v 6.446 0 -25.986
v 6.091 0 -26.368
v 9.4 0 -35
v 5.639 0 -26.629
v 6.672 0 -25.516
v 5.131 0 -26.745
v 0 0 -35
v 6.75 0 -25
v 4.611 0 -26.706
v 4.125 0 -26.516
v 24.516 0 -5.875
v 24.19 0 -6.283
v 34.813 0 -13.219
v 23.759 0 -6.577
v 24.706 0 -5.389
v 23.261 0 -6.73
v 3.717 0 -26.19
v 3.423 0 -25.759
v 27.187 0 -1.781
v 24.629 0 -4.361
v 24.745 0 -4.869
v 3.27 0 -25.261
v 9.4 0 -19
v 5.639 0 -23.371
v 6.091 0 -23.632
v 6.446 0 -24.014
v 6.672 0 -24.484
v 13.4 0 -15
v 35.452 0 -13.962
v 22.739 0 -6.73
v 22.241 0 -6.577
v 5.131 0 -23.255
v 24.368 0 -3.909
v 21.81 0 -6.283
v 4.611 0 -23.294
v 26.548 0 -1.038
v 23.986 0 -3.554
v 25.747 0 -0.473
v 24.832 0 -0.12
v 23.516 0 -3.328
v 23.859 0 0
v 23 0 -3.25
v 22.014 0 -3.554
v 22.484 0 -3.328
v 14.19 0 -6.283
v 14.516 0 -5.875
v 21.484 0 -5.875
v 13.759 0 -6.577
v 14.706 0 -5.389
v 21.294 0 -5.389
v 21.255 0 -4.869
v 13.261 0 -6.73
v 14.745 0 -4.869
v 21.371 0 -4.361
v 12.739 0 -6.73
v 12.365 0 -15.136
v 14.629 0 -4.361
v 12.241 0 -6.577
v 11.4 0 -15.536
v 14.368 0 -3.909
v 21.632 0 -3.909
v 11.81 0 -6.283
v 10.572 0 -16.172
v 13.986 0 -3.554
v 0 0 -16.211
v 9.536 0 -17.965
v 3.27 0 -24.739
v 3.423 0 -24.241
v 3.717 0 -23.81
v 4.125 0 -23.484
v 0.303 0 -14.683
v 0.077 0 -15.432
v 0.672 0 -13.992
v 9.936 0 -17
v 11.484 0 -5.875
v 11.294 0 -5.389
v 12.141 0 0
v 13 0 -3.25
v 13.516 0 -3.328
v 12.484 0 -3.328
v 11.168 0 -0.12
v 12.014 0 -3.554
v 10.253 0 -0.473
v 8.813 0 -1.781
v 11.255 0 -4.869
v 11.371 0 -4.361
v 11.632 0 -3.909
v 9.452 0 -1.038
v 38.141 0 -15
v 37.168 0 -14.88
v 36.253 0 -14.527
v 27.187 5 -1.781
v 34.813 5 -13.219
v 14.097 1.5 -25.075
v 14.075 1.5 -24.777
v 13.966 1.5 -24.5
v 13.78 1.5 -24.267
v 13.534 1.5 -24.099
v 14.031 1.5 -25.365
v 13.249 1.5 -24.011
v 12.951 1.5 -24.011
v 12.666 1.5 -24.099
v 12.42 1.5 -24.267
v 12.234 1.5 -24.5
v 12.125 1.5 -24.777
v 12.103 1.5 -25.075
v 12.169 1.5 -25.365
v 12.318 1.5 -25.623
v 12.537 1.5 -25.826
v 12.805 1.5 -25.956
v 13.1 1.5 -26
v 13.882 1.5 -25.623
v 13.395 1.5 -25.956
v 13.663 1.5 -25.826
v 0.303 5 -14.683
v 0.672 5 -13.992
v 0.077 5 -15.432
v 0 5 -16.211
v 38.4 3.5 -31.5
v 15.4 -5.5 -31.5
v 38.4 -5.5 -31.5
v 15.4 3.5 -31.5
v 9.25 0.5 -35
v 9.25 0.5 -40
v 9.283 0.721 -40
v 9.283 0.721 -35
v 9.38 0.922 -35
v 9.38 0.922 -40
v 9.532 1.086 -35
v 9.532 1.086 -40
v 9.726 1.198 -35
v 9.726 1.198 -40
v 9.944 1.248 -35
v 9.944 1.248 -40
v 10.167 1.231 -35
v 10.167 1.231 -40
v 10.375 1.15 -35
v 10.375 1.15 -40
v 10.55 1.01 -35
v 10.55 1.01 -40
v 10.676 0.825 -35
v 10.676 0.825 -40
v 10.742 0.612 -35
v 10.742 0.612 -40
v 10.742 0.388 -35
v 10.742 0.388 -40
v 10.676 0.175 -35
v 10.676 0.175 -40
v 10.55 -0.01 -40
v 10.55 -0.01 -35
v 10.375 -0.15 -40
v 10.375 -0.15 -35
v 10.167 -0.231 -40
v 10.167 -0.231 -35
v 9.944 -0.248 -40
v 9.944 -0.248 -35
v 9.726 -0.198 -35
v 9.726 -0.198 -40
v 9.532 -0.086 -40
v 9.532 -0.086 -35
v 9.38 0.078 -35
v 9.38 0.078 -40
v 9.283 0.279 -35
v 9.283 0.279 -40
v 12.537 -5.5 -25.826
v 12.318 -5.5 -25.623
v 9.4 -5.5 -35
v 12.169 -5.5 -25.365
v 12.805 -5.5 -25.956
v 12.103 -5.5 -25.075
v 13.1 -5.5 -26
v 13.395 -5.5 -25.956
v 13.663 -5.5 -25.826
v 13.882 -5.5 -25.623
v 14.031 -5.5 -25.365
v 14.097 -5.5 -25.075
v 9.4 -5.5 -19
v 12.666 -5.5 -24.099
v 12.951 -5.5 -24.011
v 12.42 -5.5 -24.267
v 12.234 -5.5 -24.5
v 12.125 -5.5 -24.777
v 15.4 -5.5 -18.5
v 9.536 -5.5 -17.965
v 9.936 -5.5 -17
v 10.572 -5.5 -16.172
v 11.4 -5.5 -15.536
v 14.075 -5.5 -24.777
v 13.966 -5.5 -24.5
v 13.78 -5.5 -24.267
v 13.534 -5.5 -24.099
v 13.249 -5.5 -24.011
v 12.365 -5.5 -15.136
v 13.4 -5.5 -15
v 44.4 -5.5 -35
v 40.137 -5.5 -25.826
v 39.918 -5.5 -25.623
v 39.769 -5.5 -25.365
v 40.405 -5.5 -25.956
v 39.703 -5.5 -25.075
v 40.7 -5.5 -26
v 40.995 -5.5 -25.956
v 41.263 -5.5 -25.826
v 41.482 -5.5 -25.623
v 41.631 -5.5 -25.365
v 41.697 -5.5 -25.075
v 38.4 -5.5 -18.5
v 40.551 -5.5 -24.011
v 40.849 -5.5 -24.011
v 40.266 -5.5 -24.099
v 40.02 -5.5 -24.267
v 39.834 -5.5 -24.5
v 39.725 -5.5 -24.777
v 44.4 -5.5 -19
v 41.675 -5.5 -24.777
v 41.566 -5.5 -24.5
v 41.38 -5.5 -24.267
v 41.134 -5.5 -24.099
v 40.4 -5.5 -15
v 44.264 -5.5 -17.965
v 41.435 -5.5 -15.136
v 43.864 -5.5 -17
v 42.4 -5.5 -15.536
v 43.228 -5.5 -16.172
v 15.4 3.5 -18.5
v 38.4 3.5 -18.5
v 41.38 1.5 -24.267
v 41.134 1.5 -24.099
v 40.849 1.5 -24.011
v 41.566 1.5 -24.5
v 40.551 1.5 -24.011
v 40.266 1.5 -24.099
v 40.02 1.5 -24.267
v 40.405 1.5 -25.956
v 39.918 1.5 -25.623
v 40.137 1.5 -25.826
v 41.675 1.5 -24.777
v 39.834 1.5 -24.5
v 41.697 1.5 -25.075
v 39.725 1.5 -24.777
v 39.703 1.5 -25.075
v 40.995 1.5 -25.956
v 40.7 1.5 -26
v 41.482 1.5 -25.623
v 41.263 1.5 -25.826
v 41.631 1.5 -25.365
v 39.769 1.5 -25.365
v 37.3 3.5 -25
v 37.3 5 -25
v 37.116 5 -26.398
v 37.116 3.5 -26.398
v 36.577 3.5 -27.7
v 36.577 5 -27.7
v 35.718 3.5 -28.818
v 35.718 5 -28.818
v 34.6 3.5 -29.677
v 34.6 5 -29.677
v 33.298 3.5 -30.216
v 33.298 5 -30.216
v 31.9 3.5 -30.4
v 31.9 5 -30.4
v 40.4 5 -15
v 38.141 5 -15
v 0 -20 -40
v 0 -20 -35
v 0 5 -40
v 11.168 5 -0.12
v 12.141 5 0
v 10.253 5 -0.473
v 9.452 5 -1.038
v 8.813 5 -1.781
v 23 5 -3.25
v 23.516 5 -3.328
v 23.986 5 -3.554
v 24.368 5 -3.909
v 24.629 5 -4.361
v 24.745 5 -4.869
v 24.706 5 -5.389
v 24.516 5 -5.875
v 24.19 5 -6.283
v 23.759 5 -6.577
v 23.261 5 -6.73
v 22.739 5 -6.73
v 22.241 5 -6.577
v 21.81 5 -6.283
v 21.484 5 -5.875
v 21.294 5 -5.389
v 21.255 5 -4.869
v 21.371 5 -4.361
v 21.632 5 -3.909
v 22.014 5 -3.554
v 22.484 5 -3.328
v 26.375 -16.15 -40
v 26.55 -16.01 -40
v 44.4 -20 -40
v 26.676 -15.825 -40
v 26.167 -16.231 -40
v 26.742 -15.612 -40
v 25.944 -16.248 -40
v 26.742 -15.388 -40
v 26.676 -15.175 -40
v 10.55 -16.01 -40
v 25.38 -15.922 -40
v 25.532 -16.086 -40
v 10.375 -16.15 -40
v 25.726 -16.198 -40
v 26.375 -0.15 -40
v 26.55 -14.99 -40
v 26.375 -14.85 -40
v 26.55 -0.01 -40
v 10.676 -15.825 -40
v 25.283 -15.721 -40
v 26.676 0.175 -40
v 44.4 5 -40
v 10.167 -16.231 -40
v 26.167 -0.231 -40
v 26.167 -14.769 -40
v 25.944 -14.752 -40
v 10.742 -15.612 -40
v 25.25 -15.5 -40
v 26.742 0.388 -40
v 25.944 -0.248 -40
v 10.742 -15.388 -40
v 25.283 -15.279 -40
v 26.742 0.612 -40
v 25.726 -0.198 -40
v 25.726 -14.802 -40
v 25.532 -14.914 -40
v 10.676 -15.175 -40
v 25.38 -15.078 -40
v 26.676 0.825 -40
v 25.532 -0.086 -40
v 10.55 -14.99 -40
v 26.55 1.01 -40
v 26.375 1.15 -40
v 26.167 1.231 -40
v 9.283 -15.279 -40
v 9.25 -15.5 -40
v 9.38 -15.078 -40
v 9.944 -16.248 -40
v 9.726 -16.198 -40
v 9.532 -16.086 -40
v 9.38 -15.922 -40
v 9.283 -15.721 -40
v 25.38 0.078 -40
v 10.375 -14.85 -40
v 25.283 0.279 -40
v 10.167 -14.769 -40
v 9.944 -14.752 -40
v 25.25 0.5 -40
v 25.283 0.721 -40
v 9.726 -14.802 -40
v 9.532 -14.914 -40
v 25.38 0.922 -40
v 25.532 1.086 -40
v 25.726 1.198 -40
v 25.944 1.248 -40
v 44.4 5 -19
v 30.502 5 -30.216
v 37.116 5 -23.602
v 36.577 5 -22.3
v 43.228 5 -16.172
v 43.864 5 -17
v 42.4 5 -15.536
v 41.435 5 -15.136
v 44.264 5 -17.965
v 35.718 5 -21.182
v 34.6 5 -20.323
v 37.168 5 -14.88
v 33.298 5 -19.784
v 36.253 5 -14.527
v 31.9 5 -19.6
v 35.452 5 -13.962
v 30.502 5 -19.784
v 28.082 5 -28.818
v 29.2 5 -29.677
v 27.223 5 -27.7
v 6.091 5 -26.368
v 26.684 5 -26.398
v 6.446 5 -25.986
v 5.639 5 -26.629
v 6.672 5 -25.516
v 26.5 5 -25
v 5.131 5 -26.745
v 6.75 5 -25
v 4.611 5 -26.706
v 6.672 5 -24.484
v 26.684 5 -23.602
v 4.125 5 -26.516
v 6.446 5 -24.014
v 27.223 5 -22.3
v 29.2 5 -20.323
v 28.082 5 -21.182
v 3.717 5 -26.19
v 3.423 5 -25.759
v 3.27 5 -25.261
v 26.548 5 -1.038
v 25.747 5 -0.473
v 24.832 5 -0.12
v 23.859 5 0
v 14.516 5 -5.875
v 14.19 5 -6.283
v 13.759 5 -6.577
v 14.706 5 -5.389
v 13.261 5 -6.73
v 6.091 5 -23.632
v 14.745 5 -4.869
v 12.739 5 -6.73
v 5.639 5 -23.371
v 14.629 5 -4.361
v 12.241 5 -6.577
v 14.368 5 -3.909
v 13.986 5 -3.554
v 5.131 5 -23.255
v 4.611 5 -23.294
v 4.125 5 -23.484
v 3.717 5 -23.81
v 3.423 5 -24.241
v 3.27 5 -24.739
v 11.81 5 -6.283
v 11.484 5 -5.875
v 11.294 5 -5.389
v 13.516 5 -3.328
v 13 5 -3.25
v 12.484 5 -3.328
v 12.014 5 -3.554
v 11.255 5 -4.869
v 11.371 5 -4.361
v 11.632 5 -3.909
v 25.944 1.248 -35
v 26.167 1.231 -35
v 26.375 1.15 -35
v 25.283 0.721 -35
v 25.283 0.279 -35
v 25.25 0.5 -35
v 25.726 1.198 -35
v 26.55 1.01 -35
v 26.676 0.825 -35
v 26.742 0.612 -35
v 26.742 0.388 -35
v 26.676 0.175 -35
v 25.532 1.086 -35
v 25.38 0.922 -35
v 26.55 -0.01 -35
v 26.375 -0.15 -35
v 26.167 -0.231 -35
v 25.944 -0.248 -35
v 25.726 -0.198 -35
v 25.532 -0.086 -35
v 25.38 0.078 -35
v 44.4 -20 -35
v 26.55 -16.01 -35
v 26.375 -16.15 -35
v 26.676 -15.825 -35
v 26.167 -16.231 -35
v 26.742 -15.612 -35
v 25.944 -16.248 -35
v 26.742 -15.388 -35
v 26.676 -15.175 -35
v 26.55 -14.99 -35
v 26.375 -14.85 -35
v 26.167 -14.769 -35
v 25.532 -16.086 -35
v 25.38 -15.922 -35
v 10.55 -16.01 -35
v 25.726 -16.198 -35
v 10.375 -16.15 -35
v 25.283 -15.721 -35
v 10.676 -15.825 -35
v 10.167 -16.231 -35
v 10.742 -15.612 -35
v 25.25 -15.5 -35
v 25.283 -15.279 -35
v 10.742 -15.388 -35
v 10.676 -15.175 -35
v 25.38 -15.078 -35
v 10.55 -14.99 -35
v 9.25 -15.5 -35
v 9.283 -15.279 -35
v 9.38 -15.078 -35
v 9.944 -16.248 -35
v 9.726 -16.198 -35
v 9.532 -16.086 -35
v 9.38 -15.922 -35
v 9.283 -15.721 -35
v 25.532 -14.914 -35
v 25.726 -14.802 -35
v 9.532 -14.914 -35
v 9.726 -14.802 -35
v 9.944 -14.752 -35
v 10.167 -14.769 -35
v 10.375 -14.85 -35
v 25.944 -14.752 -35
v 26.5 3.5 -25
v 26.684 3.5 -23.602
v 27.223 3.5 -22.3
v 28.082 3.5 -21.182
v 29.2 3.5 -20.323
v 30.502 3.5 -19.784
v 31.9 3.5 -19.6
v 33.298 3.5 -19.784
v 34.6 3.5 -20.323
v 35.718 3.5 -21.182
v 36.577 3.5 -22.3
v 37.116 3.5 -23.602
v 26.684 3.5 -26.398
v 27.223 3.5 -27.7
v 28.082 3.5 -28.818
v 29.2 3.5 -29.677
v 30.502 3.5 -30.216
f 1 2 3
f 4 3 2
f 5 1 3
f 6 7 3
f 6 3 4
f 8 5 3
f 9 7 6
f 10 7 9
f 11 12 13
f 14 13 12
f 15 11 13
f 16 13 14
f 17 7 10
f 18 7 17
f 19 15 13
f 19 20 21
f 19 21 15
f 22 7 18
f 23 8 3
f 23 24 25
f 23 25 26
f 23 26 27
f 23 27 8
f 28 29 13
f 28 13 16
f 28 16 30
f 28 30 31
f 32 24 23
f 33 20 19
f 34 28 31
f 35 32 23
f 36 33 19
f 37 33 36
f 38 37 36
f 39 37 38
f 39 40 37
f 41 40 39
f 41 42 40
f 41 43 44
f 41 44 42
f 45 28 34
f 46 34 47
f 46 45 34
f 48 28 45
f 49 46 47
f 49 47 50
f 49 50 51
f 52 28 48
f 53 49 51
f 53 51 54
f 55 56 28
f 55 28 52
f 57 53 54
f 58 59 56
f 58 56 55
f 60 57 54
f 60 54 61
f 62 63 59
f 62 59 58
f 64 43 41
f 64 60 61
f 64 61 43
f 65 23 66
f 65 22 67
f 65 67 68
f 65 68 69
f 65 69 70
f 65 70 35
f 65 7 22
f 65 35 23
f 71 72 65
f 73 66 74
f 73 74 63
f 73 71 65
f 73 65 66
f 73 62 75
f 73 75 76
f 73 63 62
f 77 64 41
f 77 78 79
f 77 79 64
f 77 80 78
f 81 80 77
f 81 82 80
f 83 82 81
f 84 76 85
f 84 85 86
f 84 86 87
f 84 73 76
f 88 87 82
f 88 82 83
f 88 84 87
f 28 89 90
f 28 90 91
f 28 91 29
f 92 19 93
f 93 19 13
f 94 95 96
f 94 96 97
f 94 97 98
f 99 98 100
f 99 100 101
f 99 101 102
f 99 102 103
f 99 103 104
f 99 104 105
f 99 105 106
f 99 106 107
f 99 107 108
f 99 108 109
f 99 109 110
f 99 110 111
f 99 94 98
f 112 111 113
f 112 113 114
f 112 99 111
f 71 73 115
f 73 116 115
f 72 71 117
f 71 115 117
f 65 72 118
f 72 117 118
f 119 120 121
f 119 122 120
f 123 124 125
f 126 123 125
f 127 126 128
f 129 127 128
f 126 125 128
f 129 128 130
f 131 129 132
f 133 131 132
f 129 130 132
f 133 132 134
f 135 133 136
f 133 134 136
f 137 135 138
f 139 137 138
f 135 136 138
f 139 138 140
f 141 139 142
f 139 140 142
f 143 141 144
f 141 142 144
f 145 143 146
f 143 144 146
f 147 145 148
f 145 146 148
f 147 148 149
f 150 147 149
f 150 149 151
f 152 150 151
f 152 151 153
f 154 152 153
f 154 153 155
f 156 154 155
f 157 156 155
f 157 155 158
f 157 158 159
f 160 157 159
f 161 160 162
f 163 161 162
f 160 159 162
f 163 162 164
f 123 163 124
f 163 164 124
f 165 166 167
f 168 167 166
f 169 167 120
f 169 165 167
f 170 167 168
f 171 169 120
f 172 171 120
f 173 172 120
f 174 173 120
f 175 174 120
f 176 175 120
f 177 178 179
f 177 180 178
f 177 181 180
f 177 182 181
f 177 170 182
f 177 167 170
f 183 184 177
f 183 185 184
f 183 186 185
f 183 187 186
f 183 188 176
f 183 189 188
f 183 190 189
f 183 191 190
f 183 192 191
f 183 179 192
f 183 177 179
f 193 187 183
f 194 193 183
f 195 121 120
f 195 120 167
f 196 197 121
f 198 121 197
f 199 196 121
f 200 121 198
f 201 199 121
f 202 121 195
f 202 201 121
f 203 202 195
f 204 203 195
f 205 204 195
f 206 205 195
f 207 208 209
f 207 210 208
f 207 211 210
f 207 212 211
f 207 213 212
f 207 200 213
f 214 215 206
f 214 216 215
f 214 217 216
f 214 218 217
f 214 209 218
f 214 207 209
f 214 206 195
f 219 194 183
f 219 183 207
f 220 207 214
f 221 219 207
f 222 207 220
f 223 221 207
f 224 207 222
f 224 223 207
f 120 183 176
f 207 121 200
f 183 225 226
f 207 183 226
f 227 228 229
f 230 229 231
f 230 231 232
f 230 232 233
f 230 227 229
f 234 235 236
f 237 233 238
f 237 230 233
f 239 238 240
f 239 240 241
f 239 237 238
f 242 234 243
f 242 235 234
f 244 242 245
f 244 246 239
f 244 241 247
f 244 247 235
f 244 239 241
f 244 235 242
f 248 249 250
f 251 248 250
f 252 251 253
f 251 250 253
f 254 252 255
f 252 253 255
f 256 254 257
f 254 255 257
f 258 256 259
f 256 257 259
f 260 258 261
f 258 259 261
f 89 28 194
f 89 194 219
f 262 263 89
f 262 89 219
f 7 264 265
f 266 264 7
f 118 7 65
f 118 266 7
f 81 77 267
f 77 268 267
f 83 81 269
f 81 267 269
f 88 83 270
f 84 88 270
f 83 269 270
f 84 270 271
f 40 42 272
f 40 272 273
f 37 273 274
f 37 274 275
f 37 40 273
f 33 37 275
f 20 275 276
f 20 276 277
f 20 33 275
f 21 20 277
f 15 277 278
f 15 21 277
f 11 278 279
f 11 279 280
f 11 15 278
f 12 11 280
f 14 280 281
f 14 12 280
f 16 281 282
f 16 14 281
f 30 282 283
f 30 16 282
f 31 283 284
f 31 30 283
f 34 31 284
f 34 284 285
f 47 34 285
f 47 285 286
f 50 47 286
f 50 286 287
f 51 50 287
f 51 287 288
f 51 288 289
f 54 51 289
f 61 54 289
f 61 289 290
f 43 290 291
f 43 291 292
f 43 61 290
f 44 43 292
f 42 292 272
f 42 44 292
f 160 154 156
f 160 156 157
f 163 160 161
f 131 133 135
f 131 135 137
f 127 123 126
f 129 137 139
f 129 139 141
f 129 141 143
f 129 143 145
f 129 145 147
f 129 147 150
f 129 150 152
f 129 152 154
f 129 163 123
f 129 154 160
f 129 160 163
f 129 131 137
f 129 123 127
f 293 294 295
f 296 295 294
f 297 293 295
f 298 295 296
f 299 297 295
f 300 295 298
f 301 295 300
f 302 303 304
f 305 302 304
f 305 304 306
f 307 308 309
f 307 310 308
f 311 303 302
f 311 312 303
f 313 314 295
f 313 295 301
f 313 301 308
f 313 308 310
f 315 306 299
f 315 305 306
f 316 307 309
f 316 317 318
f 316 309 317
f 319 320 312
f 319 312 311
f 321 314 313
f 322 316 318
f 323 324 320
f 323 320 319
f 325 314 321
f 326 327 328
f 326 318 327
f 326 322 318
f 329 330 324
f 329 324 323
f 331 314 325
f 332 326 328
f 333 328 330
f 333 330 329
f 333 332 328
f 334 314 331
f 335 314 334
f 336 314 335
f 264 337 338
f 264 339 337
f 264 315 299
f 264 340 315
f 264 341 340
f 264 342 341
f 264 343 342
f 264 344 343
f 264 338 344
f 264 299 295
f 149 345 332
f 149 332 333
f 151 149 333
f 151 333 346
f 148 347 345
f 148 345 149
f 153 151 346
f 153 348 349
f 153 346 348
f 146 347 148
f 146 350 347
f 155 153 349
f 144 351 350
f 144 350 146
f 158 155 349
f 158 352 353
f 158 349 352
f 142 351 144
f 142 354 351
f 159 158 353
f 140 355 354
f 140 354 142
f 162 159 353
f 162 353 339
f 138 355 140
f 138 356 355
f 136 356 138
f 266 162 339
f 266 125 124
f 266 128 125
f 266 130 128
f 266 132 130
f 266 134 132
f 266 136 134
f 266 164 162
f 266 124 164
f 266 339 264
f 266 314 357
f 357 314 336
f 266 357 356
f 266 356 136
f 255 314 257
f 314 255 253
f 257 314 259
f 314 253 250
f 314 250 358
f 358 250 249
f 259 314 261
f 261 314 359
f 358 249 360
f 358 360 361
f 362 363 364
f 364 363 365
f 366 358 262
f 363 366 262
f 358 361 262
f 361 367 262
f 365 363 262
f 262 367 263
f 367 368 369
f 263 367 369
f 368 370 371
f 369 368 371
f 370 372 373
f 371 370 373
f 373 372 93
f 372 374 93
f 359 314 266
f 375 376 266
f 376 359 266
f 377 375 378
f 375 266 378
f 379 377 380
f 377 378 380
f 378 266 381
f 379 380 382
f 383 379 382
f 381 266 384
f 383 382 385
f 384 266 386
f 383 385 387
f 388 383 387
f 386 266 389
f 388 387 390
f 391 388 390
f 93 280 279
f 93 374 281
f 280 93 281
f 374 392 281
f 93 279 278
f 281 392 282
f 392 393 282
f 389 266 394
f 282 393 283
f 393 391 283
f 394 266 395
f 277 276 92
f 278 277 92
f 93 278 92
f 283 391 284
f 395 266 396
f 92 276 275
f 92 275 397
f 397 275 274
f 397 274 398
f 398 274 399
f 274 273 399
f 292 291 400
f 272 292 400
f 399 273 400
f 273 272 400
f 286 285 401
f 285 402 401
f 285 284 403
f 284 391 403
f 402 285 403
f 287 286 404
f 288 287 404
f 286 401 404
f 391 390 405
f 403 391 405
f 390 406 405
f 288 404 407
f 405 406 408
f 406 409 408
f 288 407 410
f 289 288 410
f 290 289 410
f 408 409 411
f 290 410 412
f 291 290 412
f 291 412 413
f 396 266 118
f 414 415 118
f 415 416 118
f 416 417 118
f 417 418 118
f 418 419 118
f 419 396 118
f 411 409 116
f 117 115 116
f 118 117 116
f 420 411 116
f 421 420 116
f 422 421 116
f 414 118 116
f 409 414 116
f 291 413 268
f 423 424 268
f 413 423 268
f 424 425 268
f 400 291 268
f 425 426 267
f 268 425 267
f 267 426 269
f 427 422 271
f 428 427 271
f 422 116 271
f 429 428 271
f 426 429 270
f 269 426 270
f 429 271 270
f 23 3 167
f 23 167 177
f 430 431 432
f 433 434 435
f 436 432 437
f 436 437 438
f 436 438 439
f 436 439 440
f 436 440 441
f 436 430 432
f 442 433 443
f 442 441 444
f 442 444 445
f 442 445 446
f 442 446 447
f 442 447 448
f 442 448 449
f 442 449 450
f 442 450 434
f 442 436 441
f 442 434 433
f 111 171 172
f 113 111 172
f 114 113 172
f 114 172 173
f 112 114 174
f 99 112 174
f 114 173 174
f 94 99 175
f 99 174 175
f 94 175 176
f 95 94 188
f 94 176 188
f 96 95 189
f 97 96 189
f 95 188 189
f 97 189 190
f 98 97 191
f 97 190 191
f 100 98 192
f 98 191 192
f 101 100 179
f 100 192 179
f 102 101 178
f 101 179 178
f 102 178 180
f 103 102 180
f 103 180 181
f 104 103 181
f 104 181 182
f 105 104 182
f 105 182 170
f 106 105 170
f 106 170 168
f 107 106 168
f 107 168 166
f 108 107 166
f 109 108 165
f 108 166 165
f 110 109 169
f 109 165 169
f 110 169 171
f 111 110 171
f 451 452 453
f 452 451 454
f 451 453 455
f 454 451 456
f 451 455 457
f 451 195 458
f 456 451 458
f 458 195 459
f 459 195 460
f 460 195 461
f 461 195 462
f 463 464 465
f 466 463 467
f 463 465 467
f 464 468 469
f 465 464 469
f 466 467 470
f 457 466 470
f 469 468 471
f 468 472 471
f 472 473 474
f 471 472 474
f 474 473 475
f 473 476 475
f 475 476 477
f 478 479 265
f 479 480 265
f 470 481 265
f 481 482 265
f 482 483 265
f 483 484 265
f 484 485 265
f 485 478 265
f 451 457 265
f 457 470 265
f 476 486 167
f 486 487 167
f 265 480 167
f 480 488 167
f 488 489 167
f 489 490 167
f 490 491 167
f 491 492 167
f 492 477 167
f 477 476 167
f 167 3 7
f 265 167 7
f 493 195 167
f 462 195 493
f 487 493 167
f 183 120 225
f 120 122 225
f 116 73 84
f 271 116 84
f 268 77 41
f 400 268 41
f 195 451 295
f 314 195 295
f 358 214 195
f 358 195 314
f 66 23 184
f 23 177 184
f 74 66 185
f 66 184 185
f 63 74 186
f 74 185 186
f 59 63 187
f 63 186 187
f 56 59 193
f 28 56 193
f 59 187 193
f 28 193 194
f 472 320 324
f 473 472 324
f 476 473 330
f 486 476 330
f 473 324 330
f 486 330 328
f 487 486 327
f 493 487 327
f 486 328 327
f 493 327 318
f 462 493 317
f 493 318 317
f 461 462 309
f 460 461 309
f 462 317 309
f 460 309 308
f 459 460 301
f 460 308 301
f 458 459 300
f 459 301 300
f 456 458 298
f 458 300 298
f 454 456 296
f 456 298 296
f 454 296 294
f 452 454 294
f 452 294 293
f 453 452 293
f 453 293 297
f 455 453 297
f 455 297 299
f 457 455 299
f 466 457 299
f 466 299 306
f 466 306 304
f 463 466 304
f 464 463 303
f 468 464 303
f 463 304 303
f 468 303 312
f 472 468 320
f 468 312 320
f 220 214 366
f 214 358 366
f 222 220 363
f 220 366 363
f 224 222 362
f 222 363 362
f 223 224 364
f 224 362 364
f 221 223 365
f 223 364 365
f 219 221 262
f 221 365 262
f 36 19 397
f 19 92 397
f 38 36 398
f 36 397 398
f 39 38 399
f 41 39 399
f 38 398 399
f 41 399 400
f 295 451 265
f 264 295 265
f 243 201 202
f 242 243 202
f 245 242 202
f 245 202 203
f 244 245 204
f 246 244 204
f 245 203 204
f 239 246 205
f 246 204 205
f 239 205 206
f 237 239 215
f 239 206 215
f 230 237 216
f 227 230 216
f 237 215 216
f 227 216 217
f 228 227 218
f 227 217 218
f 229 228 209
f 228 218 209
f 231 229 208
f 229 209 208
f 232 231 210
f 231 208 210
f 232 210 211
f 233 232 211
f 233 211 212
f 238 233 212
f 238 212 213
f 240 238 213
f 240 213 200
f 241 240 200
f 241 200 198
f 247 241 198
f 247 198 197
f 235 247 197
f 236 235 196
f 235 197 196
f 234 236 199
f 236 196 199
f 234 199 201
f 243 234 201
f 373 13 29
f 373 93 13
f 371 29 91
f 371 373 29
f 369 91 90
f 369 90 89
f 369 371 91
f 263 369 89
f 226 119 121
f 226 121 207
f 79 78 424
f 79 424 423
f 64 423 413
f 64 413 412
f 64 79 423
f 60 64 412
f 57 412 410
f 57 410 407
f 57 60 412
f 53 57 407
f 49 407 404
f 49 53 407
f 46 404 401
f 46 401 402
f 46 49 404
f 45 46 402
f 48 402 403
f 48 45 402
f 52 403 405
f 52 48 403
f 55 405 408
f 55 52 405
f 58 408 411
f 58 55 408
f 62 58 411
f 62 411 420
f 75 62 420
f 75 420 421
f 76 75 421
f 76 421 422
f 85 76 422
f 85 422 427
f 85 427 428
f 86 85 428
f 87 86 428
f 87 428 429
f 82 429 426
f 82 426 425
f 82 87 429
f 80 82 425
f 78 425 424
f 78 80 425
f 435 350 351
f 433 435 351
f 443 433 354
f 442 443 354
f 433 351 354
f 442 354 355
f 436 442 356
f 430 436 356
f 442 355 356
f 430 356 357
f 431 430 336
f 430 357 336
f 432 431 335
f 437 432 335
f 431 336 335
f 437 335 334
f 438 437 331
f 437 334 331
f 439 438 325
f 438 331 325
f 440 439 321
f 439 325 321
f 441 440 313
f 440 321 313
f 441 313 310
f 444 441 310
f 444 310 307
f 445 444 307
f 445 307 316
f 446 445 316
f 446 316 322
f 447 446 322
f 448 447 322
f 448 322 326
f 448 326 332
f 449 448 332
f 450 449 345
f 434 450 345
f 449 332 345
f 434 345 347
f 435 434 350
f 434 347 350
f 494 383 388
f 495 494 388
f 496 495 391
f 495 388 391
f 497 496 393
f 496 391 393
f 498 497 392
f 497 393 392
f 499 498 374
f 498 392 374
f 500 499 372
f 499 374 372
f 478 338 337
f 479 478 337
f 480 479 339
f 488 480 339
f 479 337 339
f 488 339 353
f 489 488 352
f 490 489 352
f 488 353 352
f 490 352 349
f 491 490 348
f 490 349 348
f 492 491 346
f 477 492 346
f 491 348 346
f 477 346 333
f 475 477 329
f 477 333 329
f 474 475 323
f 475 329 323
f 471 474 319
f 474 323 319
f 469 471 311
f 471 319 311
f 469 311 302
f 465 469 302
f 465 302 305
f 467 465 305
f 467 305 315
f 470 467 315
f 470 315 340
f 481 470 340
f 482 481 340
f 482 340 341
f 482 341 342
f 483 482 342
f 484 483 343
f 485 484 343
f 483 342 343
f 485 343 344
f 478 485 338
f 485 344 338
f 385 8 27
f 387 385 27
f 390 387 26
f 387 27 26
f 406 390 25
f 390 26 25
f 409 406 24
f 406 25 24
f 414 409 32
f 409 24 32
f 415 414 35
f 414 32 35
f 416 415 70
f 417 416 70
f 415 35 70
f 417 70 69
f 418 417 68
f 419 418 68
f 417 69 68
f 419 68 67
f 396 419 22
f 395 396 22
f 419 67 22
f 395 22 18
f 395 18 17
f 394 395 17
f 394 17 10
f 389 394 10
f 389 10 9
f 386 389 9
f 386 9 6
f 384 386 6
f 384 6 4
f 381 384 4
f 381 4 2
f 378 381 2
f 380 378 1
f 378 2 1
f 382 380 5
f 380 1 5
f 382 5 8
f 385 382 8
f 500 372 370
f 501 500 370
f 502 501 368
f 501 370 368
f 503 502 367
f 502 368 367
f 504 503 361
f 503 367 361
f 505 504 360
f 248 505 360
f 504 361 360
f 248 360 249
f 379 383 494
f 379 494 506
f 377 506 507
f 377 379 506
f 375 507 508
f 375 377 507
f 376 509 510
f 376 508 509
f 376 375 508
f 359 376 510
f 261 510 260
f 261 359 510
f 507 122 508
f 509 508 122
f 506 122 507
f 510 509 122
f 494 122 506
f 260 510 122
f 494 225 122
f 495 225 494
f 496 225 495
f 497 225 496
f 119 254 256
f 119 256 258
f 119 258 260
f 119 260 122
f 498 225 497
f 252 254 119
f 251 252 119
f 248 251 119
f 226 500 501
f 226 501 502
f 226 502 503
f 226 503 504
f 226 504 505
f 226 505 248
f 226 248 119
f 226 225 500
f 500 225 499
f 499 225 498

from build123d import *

# Parameters (mm, degrees)
SKETCH1_R           = 1.75
SKETCH1_W           = 7.2
SKETCH1_H           = 5.4
BOSS_EXTRUDE1_DEPTH = 5
FILLET5_RADIUS      = 10
FILLET5_LENGTH      = 5
FILLET2_R           = 5.4
FILLET6_R           = 5.4
SKETCH3_W           = 35
SKETCH3_H           = 20
SKETCH3_W_2         = 23
SKETCH3_H_2         = 13
BOSS_EXTRUDE4_DEPTH = 5.5
SKETCH5_W           = 23
SKETCH5_H           = 13
CUT_EXTRUDE1_DEPTH  = 3.5
CUT_EXTRUDE2_DEPTH  = 76.201396264
SKETCH9_R           = 1
CUT_EXTRUDE4_DEPTH  = 7
SKETCH10_W          = 36
SKETCH10_H          = 5
CUT_EXTRUDE5_DEPTH  = 10
FILLET10_R          = 4
SKETCH11_W          = 44.4
SKETCH11_H          = 25
BOSS_EXTRUDE5_DEPTH = 5
SKETCH12_W          = 1.180339887
SKETCH12_H          = 5
BOSS_EXTRUDE6_DEPTH = 44.4
SKETCH13_R          = 0.75
CUT_EXTRUDE6_DEPTH  = 5


with BuildPart() as part:
    # Sketch1 → Boss-Extrude1 (new body)
    # profile 1 of 4: a face of its own
    with BuildSketch(Plane(origin=(0, 0, 0), x_dir=(1, 0, 0), z_dir=(0, 1, 0))):
        with BuildLine():
            Line((3.25, 25), (0, 25))
            Line((0, 25), (0, 15))
            Line((0, 15), (10, 0))
            Line((10, 0), (26, 0))
            Line((26, 0), (36, 15))
            Line((36, 15), (60, 15))
            Line((60, 15), (60, 25))
            Line((60, 25), (44.5, 25))
            Line((44.5, 25), (44.5, 19.6))
            Line((44.5, 19.6), (37.3, 19.6))
            Line((37.3, 19.6), (26.5, 19.6))
            Line((26.5, 19.6), (26.5, 25))
            Line((26.5, 25), (6.75, 25))
            ThreePointArc((6.75, 25), (5, 23.25), (3.25, 25))
        make_face()
        with Locations(Location((13, 5, 0), (0, 0, 270))):
            Circle(SKETCH1_R, mode=Mode.SUBTRACT)
        with Locations(Location((23, 5, 0), (0, 0, 270))):
            Circle(SKETCH1_R, mode=Mode.SUBTRACT)
    # profile 2 of 4: a face of its own
    with BuildSketch(Plane(origin=(0, 0, 0), x_dir=(1, 0, 0), z_dir=(0, 1, 0))):
        with BuildLine():
            Line((10, 45), (0, 33.819660113))
            Line((0, 33.819660113), (0, 25))
            Line((0, 25), (3.25, 25))
            ThreePointArc((3.25, 25), (5, 26.75), (6.75, 25))
            Line((6.75, 25), (26.5, 25))
            Line((26.5, 25), (26.5, 30.4))
            Line((26.5, 30.4), (37.3, 30.4))
            Line((37.3, 30.4), (44.5, 30.4))
            Line((44.5, 30.4), (44.5, 25))
            Line((44.5, 25), (60, 25))
            Line((60, 25), (60, 35))
            Line((60, 35), (36, 35))
            Line((36, 35), (26, 45))
            Line((26, 45), (10, 45))
        make_face()
    # profile 3 of 4: a face of its own
    with BuildSketch(Plane(origin=(0, 0, 0), x_dir=(1, 0, 0), z_dir=(0, 1, 0))):
        with Locations((40.9, 27.7)):
            Rectangle(SKETCH1_W, SKETCH1_H)
    # profile 4 of 4: a face of its own
    with BuildSketch(Plane(origin=(0, 0, 0), x_dir=(1, 0, 0), z_dir=(0, 1, 0))):
        with Locations((40.9, 22.3)):
            Rectangle(SKETCH1_W, SKETCH1_H)
    extrude(amount=BOSS_EXTRUDE1_DEPTH)

    # Fillet5: full round fillet: the end face becomes a half cylinder, R = half its width
    fillet5_face = Plane((60, 2.5, -25), x_dir=(0, -1, 0), z_dir=(1, 0, 0))  # on the end face: x along it, z out of the body
    fillet5_slab = fillet5_face.offset(-FILLET5_RADIUS / 2) * Box(FILLET5_LENGTH, 2 * FILLET5_RADIUS, FILLET5_RADIUS, mode=Mode.PRIVATE)  # the body's end, R deep
    fillet5_round = Plane((50, 2.5, -25), x_dir=(1, 0, 0), z_dir=(0, -1, 0)) * Cylinder(FILLET5_RADIUS, FILLET5_LENGTH, mode=Mode.PRIVATE)  # its axis R under the face
    add(fillet5_slab - fillet5_round, mode=Mode.SUBTRACT)

    # Fillet2
    fillet2_edges = [part.edges().sort_by_distance(p)[0] for p in [
        (26.5, 2.5, -30.4),
        (26.5, 2.5, -19.6),
    ]]
    fillet(fillet2_edges, radius=FILLET2_R - 0.0001)  # a hair under: the kernel refuses the full size

    # Fillet6
    fillet6_edges = [part.edges().sort_by_distance(p)[0] for p in [
        (37.3, 2.5, -19.6),
        (37.3, 2.5, -30.4),
    ]]
    fillet(fillet6_edges, radius=FILLET6_R - 0.0001)  # a hair under: the kernel refuses the full size

    # Sketch3 → Boss-Extrude4 (add)
    with BuildSketch(Plane.XZ):
        with Locations((26.9, -25)):
            Rectangle(SKETCH3_W, SKETCH3_H)
        with Locations((26.9, -25)):
            Rectangle(SKETCH3_W_2, SKETCH3_H_2, mode=Mode.SUBTRACT)
    extrude(amount=BOSS_EXTRUDE4_DEPTH)

    # Sketch5 → Cut-Extrude1 (cut)
    with BuildSketch(Plane.XZ):
        with Locations((26.9, -25)):
            Rectangle(SKETCH5_W, SKETCH5_H)
    extrude(amount=-CUT_EXTRUDE1_DEPTH, mode=Mode.SUBTRACT)

    # Sketch6 → Cut-Extrude2 (cut, through all)
    with BuildSketch(Plane.XZ):
        with BuildLine():
            Line((44.4, -15), (44.4, -35))
            Line((44.4, -35), (50, -35))
            ThreePointArc((50, -35), (60, -25), (50, -15))
            Line((50, -15), (44.4, -15))
        make_face()
    extrude(amount=-CUT_EXTRUDE2_DEPTH, mode=Mode.SUBTRACT)

    # Sketch9 → Cut-Extrude4 (cut)
    with BuildSketch(Plane.XZ.offset(5.5)):
        with Locations(Location((13.1, -25, 0), (0, 0, 270))):
            Circle(SKETCH9_R)
        with Locations(Location((40.7, -25, 0), (0, 0, 270))):
            Circle(SKETCH9_R)
    extrude(amount=-CUT_EXTRUDE4_DEPTH, mode=Mode.SUBTRACT)

    # Sketch10 → Cut-Extrude5 (cut)
    with BuildSketch(Plane(origin=(0, 0, -45), x_dir=(-1, 0, 0), z_dir=(0, 0, -1))):
        with Locations((-18, 2.5)):
            Rectangle(SKETCH10_W, SKETCH10_H)
    extrude(amount=-CUT_EXTRUDE5_DEPTH, mode=Mode.SUBTRACT)

    # Fillet10
    fillet10_edges = [part.edges().sort_by_distance(p)[0] for p in [
        (36, 2.5, -15),
        (26, 2.5, 0),
        (10, 2.5, 0),
        (0, 2.5, -15),
        (44.4, -0.25, -15),
        (9.4, -2.75, -15),
    ]]
    fillet(fillet10_edges, radius=FILLET10_R)

    # Sketch11 → Boss-Extrude5 (add)
    with BuildSketch(Plane(origin=(0, 0, -35), x_dir=(-1, 0, 0), z_dir=(0, 0, -1))):
        with Locations((-22.2, -7.5)):
            Rectangle(SKETCH11_W, SKETCH11_H)
    extrude(amount=BOSS_EXTRUDE5_DEPTH)

    # Sketch12 → Boss-Extrude6 (add)
    with BuildSketch(Plane.ZY):
        with Locations((-34.409830056, 2.5)):
            Rectangle(SKETCH12_W, SKETCH12_H)
    extrude(amount=-BOSS_EXTRUDE6_DEPTH)

    # Sketch13 → Cut-Extrude6 (cut)
    with BuildSketch(Plane(origin=(0, 0, -40), x_dir=(-1, 0, 0), z_dir=(0, 0, -1))):
        with Locations((-26, 0.5)):
            Circle(SKETCH13_R)
        with Locations((-10, 0.5)):
            Circle(SKETCH13_R)
        with Locations((-10, -15.5)):
            Circle(SKETCH13_R)
        with Locations((-26, -15.5)):
            Circle(SKETCH13_R)
    extrude(amount=-CUT_EXTRUDE6_DEPTH, mode=Mode.SUBTRACT)


solid = part.part
